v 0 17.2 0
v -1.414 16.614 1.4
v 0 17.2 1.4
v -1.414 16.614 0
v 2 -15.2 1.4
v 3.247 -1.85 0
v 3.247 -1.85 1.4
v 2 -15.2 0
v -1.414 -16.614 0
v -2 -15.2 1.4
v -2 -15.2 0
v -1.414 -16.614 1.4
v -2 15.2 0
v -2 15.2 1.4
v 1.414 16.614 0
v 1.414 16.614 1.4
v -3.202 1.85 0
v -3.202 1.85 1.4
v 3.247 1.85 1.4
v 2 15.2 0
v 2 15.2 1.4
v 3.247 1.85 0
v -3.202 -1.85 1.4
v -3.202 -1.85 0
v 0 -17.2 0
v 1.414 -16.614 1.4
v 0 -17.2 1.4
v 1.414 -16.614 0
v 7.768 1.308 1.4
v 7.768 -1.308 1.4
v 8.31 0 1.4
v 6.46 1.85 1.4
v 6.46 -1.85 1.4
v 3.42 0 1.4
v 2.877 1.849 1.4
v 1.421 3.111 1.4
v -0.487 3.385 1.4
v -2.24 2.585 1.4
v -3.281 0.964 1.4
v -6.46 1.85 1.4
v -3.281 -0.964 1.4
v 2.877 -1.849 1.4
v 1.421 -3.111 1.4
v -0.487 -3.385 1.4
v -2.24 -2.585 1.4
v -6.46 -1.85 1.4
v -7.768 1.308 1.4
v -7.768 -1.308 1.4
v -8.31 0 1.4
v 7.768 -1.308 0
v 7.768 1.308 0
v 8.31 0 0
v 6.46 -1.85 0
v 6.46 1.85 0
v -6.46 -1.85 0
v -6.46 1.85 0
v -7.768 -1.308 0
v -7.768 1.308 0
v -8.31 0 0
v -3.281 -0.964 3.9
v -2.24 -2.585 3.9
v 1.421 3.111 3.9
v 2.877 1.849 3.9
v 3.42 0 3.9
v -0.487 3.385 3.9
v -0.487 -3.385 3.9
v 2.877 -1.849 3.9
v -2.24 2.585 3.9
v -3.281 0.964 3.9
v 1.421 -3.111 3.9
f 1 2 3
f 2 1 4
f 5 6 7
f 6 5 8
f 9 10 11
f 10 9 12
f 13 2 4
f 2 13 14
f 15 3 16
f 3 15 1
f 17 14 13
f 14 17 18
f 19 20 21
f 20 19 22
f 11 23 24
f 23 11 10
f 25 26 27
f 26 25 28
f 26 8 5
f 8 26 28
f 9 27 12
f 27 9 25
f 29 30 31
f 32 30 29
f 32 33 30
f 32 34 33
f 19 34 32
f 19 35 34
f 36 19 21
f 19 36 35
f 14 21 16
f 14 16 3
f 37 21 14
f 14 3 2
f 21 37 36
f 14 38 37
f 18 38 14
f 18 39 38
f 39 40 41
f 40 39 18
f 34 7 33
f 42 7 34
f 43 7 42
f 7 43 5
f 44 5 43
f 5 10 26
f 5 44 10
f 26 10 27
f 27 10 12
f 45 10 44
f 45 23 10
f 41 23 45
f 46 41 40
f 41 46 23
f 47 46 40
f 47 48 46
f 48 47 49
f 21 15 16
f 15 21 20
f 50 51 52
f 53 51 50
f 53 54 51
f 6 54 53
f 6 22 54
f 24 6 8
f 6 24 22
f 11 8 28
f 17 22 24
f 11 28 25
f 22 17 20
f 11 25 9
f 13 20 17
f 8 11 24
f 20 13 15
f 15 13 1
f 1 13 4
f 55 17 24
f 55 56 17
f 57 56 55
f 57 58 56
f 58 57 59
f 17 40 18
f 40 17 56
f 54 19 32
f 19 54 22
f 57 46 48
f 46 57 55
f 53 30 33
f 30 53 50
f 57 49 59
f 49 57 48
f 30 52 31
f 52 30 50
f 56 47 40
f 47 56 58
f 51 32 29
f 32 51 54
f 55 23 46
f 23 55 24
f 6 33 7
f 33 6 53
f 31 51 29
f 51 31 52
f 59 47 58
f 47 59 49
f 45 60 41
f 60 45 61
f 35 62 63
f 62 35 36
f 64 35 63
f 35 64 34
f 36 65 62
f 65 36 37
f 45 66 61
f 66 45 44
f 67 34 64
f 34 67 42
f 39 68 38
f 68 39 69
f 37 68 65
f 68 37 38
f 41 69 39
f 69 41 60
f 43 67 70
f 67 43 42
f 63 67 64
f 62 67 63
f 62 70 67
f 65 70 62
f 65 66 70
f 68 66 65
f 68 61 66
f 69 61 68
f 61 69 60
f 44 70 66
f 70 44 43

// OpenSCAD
module horn(hornLaenge = 34.4,
            hornHoehe = 1.4,
            loecher = false) {
    
    difference(){
        union(){
            hull(){
                translate([0,- hornLaenge/2 +2,0])
                cylinder(r=2,h=hornHoehe, $fn=8);
                translate([0,hornLaenge/2 -2,0])
                cylinder(r=2,h=hornHoehe, $fn=8);
                
                cylinder(r=6.84/2,h= hornHoehe);
            };
            
            hull(){
                translate([16.62 / 2 - 1.85,0,0])
                cylinder(r=1.85,h = hornHoehe, $fn=8);
                translate([-16.62 / 2 + 1.85,0,0])
                cylinder(r=1.85,h = hornHoehe, $fn=8);
            };
        
            cylinder(r=6.84/2,h= 3.9);
        };
        if (loecher){
            translate([0,0,hornHoehe])
            cylinder(d=4.5, h = 30);
            cylinder(d=2.0, h=30, center=true);
        }
    };
}

horn();
